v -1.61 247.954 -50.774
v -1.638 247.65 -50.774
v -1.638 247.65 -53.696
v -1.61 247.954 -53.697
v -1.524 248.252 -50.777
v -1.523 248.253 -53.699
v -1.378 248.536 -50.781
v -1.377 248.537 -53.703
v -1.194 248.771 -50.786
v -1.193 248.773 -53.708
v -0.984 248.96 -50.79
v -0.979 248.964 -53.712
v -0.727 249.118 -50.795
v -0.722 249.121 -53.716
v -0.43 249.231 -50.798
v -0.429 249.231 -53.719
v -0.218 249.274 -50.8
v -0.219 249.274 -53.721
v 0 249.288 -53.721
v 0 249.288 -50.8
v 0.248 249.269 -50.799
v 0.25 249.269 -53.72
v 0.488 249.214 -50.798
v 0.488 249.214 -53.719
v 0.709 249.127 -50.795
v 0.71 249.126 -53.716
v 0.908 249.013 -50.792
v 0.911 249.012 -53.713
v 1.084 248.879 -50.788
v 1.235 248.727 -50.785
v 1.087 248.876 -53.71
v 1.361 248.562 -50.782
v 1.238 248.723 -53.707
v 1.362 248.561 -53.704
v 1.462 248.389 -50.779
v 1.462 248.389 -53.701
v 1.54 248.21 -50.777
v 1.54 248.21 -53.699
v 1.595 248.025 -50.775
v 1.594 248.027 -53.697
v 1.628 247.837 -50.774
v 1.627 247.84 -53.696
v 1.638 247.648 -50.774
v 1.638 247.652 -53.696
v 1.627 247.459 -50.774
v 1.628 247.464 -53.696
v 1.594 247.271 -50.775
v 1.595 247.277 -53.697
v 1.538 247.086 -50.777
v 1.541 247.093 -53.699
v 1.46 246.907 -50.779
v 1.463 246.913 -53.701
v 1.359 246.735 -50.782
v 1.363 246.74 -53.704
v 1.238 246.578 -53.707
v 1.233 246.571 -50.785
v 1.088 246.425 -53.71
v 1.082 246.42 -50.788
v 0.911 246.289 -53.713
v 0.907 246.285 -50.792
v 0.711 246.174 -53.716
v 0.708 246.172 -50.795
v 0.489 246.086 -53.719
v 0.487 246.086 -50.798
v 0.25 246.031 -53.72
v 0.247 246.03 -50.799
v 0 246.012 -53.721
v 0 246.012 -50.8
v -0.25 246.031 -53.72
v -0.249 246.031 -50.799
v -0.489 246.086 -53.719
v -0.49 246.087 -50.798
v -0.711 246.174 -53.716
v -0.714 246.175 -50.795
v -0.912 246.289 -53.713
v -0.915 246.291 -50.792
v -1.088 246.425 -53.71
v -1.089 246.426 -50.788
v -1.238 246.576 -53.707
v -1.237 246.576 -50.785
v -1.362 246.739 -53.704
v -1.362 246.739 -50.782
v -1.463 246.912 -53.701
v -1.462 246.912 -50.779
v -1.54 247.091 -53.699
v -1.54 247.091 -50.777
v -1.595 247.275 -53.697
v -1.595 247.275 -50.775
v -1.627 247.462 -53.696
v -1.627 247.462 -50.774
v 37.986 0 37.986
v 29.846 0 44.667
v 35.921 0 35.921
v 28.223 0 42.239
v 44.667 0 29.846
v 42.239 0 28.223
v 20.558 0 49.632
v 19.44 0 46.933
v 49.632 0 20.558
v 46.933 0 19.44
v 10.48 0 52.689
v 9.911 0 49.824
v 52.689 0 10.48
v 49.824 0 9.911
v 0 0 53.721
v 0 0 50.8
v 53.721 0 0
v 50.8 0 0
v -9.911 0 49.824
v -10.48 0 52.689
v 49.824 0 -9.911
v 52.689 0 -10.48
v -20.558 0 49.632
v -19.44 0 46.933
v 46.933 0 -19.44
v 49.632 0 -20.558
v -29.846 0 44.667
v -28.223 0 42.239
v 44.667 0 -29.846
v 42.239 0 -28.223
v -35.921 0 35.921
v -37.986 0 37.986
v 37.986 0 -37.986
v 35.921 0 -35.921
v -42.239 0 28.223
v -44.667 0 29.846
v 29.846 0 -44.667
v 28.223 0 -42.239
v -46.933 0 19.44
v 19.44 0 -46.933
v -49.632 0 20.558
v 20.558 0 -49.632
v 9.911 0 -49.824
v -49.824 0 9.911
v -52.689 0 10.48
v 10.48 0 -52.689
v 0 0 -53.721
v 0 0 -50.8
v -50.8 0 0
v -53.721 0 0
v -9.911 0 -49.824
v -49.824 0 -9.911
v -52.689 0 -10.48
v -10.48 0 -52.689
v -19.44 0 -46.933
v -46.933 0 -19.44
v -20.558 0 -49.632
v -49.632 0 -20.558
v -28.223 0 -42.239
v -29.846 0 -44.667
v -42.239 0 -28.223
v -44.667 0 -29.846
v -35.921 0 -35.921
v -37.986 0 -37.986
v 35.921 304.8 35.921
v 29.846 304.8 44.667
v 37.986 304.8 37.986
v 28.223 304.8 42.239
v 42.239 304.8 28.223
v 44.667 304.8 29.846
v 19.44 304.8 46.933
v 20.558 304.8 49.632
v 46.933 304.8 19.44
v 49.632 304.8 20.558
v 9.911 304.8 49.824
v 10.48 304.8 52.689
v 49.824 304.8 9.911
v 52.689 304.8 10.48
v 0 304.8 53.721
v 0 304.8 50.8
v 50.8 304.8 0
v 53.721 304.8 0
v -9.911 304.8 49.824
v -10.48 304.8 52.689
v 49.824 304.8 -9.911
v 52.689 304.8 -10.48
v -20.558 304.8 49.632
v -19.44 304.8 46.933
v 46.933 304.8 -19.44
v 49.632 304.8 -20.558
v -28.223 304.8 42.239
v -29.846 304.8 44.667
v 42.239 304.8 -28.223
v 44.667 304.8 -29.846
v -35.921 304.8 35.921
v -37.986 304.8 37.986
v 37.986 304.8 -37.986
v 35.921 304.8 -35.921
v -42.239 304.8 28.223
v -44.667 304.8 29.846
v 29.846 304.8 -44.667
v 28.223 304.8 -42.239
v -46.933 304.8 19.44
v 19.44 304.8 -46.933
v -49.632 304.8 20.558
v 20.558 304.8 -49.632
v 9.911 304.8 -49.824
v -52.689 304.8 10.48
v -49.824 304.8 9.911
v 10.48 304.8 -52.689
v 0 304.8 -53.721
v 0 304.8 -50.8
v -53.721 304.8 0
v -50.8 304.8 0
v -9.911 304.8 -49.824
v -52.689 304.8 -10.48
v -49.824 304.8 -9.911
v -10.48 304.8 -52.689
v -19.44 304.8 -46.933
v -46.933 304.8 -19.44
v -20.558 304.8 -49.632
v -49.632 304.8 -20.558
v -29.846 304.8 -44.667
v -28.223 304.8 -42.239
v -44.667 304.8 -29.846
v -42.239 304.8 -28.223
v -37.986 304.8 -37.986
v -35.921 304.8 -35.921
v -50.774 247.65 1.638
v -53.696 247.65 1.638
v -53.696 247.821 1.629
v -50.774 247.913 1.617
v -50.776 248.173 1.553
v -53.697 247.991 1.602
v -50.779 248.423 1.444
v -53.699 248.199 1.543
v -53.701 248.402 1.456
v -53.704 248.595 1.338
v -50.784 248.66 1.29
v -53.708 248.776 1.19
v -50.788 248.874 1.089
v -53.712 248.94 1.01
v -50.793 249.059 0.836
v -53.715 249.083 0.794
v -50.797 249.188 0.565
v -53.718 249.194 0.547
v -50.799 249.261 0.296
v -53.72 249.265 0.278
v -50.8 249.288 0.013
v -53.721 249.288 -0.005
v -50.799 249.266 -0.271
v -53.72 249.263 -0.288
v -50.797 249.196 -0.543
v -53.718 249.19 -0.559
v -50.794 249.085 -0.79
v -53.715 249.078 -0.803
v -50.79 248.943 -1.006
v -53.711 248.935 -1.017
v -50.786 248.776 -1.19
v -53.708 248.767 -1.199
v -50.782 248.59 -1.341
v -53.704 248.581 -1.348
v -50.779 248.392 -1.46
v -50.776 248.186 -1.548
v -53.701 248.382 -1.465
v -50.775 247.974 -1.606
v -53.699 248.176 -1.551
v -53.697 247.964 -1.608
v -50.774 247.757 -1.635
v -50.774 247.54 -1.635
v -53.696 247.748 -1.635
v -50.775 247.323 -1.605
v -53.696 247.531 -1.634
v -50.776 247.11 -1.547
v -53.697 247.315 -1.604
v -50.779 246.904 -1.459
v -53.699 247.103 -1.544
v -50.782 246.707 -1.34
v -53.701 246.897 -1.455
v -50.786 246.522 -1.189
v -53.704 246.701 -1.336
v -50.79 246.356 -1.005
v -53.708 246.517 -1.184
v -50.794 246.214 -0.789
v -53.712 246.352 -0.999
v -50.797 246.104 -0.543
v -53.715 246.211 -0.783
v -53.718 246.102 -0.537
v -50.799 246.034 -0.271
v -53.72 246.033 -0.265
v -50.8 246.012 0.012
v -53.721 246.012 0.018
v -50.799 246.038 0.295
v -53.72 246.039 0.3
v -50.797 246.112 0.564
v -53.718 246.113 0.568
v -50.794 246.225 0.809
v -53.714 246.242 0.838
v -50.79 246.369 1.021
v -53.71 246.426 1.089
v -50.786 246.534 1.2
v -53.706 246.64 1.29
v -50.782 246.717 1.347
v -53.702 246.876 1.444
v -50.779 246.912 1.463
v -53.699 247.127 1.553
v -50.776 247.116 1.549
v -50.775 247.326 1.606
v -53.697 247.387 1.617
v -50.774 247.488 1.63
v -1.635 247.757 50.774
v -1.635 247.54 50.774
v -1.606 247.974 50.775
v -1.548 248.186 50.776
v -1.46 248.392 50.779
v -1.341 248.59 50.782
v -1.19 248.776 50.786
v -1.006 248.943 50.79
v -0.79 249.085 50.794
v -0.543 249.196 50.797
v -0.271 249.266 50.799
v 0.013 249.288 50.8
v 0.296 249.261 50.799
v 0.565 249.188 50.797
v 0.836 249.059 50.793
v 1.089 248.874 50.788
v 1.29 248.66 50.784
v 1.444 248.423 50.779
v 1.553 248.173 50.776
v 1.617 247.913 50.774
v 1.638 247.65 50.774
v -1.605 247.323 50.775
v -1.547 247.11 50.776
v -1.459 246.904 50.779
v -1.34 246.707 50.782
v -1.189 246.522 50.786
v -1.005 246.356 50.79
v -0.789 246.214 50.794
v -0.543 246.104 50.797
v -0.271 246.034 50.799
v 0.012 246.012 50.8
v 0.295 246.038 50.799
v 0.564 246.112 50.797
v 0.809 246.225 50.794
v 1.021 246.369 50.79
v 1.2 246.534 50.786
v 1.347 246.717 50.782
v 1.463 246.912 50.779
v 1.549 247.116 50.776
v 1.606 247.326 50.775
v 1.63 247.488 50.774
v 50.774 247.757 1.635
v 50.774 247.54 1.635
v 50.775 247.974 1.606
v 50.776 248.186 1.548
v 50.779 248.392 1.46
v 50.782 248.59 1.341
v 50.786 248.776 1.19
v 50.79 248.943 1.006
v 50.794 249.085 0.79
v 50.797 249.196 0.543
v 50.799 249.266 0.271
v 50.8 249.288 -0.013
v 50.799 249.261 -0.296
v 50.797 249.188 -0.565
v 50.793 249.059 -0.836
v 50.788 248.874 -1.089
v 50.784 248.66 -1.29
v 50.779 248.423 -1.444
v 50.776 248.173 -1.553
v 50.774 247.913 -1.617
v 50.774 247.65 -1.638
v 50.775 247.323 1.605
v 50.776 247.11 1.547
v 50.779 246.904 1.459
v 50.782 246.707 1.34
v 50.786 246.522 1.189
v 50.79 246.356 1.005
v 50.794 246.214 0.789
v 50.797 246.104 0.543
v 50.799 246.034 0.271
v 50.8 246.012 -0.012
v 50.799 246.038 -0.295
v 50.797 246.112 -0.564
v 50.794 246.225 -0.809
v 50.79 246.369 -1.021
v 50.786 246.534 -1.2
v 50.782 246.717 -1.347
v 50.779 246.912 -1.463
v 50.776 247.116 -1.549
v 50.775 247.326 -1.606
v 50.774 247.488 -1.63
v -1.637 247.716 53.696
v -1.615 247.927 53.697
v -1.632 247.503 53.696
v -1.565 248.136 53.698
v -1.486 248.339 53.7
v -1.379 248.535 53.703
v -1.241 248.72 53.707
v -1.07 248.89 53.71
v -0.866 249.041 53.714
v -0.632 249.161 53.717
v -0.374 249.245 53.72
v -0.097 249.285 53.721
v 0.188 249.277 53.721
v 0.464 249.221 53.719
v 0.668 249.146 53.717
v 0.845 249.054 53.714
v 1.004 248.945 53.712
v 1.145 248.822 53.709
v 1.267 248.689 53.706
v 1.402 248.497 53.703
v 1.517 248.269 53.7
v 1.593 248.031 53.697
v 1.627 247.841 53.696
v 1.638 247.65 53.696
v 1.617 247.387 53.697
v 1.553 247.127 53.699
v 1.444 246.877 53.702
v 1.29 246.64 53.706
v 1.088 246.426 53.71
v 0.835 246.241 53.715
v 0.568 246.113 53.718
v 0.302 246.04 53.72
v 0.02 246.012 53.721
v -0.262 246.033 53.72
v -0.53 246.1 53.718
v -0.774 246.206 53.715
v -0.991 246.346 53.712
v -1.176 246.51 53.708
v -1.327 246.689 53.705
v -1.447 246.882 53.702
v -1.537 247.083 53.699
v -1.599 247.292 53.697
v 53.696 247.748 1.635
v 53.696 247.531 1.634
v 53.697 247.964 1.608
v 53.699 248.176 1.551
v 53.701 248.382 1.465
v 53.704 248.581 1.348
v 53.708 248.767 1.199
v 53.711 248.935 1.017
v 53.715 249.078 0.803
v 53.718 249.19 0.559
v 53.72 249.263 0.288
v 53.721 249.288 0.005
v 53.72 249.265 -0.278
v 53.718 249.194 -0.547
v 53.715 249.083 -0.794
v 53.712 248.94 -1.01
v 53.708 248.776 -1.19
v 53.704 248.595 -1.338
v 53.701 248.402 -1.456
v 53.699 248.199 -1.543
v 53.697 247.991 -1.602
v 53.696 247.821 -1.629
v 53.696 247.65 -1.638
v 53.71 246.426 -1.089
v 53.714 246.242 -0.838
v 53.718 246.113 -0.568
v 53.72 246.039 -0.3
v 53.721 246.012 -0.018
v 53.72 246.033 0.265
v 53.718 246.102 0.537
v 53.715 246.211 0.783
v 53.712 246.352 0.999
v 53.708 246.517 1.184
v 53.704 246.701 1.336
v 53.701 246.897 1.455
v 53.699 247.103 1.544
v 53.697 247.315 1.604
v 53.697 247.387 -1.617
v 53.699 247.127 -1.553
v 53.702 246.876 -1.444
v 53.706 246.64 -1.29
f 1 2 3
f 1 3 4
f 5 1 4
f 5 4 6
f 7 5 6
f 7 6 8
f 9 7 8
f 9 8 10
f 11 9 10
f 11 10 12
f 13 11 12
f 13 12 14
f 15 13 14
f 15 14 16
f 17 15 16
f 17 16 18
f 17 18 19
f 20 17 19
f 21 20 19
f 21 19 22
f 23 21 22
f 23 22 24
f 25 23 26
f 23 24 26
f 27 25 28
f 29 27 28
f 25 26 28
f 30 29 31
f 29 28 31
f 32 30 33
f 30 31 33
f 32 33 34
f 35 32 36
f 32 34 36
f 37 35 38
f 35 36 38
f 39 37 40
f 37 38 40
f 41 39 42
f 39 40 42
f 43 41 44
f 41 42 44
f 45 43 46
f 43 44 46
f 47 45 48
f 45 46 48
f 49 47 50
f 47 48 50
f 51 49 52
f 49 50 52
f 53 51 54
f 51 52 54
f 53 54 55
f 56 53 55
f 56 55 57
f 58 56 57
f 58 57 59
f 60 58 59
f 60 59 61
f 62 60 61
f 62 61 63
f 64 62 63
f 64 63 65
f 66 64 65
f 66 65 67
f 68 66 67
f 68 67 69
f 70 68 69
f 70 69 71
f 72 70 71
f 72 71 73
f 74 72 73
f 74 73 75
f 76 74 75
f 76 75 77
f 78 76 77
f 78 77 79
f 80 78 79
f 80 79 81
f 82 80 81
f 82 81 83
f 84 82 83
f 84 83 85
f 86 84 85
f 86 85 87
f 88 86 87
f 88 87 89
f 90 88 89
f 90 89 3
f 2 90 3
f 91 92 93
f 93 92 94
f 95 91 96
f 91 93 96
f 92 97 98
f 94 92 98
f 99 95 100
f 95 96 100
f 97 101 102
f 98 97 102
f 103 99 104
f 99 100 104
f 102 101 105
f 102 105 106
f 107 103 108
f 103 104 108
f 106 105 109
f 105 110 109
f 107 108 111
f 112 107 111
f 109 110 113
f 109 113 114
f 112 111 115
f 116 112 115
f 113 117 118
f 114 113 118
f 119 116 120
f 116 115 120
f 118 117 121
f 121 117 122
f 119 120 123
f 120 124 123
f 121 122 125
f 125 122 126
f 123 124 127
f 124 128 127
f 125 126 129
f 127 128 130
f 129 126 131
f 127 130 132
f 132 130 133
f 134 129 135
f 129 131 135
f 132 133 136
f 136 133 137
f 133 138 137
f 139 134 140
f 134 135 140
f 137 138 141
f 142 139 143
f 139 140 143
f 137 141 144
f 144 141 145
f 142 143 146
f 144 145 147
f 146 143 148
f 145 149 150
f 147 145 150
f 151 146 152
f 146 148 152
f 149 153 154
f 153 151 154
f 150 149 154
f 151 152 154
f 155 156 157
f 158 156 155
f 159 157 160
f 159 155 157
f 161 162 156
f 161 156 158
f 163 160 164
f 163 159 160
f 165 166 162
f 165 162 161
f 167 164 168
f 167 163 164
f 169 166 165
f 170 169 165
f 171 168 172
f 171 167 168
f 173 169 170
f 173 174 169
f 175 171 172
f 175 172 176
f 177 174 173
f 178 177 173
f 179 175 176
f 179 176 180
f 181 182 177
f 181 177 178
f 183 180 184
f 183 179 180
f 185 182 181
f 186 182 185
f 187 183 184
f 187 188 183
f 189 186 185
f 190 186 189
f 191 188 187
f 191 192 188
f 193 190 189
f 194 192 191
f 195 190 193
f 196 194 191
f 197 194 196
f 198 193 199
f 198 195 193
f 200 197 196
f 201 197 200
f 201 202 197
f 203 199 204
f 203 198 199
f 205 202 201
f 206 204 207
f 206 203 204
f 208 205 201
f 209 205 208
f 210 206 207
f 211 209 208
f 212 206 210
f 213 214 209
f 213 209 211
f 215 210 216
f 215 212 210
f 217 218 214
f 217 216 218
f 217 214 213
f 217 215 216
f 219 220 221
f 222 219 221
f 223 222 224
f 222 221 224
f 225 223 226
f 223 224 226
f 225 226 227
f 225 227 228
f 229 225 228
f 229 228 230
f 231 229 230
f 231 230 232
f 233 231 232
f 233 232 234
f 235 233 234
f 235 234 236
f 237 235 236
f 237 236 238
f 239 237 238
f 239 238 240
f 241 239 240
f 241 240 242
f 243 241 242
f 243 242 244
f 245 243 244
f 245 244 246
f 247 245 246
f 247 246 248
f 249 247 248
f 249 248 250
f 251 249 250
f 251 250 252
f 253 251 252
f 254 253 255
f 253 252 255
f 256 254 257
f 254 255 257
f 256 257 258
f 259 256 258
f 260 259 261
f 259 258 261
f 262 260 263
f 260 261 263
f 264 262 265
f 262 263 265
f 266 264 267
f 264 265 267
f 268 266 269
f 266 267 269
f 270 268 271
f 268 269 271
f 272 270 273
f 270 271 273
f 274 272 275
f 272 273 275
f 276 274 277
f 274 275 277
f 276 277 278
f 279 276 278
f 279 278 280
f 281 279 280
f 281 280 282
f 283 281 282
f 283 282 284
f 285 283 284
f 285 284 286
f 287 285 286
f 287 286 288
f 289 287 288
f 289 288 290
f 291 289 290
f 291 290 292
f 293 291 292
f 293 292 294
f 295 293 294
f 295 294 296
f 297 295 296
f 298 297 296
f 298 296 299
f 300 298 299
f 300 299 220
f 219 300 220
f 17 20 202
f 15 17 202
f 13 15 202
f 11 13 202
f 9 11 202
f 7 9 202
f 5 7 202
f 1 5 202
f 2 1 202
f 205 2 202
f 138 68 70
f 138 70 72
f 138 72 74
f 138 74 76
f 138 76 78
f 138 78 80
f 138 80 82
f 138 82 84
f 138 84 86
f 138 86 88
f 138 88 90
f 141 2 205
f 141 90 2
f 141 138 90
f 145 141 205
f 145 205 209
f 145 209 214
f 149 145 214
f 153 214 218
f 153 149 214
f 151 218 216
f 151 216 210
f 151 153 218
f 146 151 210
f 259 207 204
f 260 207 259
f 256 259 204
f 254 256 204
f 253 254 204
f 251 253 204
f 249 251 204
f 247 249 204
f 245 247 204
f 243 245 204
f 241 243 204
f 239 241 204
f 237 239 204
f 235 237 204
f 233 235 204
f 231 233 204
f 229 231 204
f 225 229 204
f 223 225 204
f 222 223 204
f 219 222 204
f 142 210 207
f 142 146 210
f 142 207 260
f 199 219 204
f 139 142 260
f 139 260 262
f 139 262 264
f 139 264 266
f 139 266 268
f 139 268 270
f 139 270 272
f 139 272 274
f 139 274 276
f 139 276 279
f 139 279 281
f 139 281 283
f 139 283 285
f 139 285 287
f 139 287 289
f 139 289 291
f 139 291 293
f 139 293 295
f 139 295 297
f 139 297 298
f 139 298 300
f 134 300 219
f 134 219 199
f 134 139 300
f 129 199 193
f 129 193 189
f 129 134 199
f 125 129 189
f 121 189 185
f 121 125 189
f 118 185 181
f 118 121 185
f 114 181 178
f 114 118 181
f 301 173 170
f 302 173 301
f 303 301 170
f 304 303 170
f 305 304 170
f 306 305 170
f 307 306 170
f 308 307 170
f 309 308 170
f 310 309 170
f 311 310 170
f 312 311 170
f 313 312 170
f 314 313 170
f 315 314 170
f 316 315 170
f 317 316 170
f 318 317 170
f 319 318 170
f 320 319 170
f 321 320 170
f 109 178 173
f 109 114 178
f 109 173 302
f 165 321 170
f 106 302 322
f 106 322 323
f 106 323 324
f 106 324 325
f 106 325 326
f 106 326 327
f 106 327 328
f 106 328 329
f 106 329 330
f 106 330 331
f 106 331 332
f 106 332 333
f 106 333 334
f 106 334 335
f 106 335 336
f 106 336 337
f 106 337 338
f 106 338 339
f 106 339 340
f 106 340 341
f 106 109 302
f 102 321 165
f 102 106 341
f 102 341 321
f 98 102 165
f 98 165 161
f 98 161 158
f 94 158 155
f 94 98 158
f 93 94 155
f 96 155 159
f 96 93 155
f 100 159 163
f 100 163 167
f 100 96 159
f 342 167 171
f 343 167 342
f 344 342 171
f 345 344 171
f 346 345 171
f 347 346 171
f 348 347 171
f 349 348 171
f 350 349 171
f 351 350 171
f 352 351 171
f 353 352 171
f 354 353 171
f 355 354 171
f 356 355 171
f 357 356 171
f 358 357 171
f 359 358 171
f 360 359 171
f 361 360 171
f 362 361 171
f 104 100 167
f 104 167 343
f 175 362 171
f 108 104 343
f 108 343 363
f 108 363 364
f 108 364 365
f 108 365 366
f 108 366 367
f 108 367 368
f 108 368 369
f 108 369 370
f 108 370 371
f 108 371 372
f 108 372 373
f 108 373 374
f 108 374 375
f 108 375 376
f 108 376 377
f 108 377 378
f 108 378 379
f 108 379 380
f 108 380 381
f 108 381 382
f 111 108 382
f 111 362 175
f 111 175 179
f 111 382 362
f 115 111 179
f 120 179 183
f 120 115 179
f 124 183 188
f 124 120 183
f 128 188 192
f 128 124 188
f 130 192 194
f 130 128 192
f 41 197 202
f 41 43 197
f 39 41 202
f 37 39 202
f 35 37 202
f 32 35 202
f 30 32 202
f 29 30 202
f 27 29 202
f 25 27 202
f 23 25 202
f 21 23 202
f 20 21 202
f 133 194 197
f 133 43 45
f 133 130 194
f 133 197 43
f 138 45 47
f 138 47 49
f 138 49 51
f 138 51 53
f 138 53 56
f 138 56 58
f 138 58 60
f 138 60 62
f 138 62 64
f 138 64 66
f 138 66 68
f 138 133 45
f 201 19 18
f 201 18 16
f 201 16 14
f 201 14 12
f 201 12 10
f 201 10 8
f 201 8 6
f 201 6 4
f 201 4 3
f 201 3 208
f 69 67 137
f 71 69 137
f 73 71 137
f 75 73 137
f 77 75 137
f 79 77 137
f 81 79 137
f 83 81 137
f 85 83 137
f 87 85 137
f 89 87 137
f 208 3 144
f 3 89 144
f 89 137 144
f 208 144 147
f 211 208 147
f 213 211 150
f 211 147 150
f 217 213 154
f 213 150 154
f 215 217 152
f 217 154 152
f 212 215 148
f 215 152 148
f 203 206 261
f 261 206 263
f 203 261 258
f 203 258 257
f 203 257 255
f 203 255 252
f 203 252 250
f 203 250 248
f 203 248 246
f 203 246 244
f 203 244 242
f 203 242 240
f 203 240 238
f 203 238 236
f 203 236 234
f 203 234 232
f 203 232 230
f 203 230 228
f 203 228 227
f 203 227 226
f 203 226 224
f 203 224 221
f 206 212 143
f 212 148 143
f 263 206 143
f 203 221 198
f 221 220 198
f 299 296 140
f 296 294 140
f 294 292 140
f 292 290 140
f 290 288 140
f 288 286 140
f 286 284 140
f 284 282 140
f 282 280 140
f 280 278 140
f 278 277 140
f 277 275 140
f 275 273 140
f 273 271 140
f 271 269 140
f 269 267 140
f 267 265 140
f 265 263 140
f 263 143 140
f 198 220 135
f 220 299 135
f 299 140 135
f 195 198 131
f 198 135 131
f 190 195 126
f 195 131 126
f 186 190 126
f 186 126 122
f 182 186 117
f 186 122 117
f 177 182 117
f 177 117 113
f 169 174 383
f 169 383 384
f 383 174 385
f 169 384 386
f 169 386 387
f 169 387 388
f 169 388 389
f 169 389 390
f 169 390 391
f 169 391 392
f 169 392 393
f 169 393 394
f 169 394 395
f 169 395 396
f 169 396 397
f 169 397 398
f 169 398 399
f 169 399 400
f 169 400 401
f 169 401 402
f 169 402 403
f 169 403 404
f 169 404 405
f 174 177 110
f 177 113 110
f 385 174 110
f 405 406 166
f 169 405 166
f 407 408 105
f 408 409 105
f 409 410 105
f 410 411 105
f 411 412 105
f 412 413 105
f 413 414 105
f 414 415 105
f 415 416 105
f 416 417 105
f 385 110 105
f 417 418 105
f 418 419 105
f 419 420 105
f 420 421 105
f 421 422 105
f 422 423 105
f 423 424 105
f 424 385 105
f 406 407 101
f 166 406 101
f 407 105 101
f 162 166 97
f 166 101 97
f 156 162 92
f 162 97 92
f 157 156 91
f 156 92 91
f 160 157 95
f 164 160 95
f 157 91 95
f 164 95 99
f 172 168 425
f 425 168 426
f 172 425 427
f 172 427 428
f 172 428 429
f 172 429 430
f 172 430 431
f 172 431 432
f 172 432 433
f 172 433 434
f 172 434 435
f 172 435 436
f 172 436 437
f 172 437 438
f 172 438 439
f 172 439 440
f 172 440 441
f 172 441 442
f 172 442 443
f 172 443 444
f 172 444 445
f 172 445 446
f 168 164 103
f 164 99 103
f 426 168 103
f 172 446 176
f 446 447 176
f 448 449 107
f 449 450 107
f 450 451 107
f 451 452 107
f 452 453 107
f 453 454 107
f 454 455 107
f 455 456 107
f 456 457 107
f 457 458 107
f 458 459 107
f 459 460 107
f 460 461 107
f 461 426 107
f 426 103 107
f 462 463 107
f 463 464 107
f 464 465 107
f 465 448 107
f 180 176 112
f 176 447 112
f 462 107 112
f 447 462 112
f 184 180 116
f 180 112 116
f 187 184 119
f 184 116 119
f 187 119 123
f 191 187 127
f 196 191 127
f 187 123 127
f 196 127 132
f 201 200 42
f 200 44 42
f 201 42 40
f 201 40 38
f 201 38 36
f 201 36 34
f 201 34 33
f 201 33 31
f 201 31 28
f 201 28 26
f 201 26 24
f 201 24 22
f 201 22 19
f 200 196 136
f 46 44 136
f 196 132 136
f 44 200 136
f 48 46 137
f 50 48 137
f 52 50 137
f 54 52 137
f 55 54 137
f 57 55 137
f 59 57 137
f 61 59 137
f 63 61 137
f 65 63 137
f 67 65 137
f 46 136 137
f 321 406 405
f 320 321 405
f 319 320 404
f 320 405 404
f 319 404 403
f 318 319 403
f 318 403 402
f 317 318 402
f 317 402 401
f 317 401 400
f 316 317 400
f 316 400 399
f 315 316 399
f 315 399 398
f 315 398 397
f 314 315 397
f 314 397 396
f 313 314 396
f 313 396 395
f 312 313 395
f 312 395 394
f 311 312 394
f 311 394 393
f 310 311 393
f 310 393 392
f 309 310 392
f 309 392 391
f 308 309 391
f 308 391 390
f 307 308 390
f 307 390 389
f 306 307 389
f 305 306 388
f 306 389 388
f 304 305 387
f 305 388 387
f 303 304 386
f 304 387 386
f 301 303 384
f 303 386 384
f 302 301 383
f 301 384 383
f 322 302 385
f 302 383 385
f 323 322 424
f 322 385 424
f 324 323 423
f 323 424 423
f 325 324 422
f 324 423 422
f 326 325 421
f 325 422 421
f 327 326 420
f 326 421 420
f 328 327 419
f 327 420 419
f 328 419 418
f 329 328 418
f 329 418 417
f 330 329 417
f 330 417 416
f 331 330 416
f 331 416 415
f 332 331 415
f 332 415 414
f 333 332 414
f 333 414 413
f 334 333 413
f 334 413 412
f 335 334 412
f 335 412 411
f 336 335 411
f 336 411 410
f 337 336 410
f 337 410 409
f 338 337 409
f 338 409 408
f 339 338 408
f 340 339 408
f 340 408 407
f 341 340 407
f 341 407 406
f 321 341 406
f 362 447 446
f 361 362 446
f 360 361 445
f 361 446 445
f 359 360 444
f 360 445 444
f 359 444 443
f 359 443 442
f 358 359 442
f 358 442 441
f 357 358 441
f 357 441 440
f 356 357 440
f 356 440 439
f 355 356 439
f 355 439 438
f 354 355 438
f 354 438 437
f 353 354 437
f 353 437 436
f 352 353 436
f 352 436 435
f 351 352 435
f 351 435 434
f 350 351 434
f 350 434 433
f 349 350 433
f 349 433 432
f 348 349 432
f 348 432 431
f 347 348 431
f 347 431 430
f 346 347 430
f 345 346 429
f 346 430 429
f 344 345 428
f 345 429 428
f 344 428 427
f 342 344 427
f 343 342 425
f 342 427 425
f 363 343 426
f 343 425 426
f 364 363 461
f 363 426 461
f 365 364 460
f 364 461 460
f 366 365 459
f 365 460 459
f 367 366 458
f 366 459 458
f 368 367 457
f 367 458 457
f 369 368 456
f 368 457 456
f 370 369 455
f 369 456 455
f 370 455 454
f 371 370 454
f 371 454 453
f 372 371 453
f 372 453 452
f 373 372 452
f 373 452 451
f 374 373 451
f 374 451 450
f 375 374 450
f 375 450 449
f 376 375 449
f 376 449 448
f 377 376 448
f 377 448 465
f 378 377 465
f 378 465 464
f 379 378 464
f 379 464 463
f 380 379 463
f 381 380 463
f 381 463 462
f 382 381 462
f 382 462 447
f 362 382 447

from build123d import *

# Parameters (mm, degrees)
SKETCH1_R               = 53.721
SKETCH1_R_2             = 50.8
TUBE_EXTRUSION_DEPTH    = 304.8
CUT_EXTRUDE1_REACH      = 329.617
CUT_EXTRUDE1_END_RADIUS = 50.8
SKETCH2_R               = 1.6383
CIRPATTERN1_COUNT       = 4


with BuildPart() as part:
    # Sketch1 → Tube Extrusion (new body)
    with BuildSketch(Plane(origin=(0, 0, 0), x_dir=(1, 0, 0), z_dir=(0, 1, 0))):
        with Locations(Location((0, 0, 0), (0, 0, 90))):
            Circle(SKETCH1_R)
        with Locations(Location((0, 0, 0), (0, 0, 90))):
            Circle(SKETCH1_R_2, mode=Mode.SUBTRACT)
    extrude(amount=TUBE_EXTRUSION_DEPTH)

    # Cut-Extrude1: up to this cylinder (the profile starts outside it)
    cut_extrude1_end = Plane(origin=(0, 247.65, 0), z_dir=(0, -1, 0)) * Cylinder(CUT_EXTRUDE1_END_RADIUS, 761.834, mode=Mode.PRIVATE)
    # Sketch2 → Cut-Extrude1 (cut, up to the surface)
    with BuildSketch(Plane(origin=(53.721, 0, 0), x_dir=(0, 0, -1), z_dir=(1, 0, 0)), mode=Mode.PRIVATE) as cut_extrude1_sk1:
        with Locations((0, 247.65)):
            Circle(SKETCH2_R)
    cut_extrude1_tool1 = extrude(cut_extrude1_sk1.sketch, amount=-CUT_EXTRUDE1_REACH, mode=Mode.PRIVATE) - cut_extrude1_end
    cut_extrude1 = cut_extrude1_tool1.solids().sort_by_distance((53.721, 247.65, 0))[0]
    add(cut_extrude1, mode=Mode.SUBTRACT)

    # CirPattern1: Cut-Extrude1 ×4 about axis
    cirpattern1_axis = Axis((0, 304.8, 0), (0, -1, 0))
    for i in range(1, CIRPATTERN1_COUNT):
        add(cut_extrude1.rotate(cirpattern1_axis, i * 360 / CIRPATTERN1_COUNT), mode=Mode.SUBTRACT)


solid = part.part
